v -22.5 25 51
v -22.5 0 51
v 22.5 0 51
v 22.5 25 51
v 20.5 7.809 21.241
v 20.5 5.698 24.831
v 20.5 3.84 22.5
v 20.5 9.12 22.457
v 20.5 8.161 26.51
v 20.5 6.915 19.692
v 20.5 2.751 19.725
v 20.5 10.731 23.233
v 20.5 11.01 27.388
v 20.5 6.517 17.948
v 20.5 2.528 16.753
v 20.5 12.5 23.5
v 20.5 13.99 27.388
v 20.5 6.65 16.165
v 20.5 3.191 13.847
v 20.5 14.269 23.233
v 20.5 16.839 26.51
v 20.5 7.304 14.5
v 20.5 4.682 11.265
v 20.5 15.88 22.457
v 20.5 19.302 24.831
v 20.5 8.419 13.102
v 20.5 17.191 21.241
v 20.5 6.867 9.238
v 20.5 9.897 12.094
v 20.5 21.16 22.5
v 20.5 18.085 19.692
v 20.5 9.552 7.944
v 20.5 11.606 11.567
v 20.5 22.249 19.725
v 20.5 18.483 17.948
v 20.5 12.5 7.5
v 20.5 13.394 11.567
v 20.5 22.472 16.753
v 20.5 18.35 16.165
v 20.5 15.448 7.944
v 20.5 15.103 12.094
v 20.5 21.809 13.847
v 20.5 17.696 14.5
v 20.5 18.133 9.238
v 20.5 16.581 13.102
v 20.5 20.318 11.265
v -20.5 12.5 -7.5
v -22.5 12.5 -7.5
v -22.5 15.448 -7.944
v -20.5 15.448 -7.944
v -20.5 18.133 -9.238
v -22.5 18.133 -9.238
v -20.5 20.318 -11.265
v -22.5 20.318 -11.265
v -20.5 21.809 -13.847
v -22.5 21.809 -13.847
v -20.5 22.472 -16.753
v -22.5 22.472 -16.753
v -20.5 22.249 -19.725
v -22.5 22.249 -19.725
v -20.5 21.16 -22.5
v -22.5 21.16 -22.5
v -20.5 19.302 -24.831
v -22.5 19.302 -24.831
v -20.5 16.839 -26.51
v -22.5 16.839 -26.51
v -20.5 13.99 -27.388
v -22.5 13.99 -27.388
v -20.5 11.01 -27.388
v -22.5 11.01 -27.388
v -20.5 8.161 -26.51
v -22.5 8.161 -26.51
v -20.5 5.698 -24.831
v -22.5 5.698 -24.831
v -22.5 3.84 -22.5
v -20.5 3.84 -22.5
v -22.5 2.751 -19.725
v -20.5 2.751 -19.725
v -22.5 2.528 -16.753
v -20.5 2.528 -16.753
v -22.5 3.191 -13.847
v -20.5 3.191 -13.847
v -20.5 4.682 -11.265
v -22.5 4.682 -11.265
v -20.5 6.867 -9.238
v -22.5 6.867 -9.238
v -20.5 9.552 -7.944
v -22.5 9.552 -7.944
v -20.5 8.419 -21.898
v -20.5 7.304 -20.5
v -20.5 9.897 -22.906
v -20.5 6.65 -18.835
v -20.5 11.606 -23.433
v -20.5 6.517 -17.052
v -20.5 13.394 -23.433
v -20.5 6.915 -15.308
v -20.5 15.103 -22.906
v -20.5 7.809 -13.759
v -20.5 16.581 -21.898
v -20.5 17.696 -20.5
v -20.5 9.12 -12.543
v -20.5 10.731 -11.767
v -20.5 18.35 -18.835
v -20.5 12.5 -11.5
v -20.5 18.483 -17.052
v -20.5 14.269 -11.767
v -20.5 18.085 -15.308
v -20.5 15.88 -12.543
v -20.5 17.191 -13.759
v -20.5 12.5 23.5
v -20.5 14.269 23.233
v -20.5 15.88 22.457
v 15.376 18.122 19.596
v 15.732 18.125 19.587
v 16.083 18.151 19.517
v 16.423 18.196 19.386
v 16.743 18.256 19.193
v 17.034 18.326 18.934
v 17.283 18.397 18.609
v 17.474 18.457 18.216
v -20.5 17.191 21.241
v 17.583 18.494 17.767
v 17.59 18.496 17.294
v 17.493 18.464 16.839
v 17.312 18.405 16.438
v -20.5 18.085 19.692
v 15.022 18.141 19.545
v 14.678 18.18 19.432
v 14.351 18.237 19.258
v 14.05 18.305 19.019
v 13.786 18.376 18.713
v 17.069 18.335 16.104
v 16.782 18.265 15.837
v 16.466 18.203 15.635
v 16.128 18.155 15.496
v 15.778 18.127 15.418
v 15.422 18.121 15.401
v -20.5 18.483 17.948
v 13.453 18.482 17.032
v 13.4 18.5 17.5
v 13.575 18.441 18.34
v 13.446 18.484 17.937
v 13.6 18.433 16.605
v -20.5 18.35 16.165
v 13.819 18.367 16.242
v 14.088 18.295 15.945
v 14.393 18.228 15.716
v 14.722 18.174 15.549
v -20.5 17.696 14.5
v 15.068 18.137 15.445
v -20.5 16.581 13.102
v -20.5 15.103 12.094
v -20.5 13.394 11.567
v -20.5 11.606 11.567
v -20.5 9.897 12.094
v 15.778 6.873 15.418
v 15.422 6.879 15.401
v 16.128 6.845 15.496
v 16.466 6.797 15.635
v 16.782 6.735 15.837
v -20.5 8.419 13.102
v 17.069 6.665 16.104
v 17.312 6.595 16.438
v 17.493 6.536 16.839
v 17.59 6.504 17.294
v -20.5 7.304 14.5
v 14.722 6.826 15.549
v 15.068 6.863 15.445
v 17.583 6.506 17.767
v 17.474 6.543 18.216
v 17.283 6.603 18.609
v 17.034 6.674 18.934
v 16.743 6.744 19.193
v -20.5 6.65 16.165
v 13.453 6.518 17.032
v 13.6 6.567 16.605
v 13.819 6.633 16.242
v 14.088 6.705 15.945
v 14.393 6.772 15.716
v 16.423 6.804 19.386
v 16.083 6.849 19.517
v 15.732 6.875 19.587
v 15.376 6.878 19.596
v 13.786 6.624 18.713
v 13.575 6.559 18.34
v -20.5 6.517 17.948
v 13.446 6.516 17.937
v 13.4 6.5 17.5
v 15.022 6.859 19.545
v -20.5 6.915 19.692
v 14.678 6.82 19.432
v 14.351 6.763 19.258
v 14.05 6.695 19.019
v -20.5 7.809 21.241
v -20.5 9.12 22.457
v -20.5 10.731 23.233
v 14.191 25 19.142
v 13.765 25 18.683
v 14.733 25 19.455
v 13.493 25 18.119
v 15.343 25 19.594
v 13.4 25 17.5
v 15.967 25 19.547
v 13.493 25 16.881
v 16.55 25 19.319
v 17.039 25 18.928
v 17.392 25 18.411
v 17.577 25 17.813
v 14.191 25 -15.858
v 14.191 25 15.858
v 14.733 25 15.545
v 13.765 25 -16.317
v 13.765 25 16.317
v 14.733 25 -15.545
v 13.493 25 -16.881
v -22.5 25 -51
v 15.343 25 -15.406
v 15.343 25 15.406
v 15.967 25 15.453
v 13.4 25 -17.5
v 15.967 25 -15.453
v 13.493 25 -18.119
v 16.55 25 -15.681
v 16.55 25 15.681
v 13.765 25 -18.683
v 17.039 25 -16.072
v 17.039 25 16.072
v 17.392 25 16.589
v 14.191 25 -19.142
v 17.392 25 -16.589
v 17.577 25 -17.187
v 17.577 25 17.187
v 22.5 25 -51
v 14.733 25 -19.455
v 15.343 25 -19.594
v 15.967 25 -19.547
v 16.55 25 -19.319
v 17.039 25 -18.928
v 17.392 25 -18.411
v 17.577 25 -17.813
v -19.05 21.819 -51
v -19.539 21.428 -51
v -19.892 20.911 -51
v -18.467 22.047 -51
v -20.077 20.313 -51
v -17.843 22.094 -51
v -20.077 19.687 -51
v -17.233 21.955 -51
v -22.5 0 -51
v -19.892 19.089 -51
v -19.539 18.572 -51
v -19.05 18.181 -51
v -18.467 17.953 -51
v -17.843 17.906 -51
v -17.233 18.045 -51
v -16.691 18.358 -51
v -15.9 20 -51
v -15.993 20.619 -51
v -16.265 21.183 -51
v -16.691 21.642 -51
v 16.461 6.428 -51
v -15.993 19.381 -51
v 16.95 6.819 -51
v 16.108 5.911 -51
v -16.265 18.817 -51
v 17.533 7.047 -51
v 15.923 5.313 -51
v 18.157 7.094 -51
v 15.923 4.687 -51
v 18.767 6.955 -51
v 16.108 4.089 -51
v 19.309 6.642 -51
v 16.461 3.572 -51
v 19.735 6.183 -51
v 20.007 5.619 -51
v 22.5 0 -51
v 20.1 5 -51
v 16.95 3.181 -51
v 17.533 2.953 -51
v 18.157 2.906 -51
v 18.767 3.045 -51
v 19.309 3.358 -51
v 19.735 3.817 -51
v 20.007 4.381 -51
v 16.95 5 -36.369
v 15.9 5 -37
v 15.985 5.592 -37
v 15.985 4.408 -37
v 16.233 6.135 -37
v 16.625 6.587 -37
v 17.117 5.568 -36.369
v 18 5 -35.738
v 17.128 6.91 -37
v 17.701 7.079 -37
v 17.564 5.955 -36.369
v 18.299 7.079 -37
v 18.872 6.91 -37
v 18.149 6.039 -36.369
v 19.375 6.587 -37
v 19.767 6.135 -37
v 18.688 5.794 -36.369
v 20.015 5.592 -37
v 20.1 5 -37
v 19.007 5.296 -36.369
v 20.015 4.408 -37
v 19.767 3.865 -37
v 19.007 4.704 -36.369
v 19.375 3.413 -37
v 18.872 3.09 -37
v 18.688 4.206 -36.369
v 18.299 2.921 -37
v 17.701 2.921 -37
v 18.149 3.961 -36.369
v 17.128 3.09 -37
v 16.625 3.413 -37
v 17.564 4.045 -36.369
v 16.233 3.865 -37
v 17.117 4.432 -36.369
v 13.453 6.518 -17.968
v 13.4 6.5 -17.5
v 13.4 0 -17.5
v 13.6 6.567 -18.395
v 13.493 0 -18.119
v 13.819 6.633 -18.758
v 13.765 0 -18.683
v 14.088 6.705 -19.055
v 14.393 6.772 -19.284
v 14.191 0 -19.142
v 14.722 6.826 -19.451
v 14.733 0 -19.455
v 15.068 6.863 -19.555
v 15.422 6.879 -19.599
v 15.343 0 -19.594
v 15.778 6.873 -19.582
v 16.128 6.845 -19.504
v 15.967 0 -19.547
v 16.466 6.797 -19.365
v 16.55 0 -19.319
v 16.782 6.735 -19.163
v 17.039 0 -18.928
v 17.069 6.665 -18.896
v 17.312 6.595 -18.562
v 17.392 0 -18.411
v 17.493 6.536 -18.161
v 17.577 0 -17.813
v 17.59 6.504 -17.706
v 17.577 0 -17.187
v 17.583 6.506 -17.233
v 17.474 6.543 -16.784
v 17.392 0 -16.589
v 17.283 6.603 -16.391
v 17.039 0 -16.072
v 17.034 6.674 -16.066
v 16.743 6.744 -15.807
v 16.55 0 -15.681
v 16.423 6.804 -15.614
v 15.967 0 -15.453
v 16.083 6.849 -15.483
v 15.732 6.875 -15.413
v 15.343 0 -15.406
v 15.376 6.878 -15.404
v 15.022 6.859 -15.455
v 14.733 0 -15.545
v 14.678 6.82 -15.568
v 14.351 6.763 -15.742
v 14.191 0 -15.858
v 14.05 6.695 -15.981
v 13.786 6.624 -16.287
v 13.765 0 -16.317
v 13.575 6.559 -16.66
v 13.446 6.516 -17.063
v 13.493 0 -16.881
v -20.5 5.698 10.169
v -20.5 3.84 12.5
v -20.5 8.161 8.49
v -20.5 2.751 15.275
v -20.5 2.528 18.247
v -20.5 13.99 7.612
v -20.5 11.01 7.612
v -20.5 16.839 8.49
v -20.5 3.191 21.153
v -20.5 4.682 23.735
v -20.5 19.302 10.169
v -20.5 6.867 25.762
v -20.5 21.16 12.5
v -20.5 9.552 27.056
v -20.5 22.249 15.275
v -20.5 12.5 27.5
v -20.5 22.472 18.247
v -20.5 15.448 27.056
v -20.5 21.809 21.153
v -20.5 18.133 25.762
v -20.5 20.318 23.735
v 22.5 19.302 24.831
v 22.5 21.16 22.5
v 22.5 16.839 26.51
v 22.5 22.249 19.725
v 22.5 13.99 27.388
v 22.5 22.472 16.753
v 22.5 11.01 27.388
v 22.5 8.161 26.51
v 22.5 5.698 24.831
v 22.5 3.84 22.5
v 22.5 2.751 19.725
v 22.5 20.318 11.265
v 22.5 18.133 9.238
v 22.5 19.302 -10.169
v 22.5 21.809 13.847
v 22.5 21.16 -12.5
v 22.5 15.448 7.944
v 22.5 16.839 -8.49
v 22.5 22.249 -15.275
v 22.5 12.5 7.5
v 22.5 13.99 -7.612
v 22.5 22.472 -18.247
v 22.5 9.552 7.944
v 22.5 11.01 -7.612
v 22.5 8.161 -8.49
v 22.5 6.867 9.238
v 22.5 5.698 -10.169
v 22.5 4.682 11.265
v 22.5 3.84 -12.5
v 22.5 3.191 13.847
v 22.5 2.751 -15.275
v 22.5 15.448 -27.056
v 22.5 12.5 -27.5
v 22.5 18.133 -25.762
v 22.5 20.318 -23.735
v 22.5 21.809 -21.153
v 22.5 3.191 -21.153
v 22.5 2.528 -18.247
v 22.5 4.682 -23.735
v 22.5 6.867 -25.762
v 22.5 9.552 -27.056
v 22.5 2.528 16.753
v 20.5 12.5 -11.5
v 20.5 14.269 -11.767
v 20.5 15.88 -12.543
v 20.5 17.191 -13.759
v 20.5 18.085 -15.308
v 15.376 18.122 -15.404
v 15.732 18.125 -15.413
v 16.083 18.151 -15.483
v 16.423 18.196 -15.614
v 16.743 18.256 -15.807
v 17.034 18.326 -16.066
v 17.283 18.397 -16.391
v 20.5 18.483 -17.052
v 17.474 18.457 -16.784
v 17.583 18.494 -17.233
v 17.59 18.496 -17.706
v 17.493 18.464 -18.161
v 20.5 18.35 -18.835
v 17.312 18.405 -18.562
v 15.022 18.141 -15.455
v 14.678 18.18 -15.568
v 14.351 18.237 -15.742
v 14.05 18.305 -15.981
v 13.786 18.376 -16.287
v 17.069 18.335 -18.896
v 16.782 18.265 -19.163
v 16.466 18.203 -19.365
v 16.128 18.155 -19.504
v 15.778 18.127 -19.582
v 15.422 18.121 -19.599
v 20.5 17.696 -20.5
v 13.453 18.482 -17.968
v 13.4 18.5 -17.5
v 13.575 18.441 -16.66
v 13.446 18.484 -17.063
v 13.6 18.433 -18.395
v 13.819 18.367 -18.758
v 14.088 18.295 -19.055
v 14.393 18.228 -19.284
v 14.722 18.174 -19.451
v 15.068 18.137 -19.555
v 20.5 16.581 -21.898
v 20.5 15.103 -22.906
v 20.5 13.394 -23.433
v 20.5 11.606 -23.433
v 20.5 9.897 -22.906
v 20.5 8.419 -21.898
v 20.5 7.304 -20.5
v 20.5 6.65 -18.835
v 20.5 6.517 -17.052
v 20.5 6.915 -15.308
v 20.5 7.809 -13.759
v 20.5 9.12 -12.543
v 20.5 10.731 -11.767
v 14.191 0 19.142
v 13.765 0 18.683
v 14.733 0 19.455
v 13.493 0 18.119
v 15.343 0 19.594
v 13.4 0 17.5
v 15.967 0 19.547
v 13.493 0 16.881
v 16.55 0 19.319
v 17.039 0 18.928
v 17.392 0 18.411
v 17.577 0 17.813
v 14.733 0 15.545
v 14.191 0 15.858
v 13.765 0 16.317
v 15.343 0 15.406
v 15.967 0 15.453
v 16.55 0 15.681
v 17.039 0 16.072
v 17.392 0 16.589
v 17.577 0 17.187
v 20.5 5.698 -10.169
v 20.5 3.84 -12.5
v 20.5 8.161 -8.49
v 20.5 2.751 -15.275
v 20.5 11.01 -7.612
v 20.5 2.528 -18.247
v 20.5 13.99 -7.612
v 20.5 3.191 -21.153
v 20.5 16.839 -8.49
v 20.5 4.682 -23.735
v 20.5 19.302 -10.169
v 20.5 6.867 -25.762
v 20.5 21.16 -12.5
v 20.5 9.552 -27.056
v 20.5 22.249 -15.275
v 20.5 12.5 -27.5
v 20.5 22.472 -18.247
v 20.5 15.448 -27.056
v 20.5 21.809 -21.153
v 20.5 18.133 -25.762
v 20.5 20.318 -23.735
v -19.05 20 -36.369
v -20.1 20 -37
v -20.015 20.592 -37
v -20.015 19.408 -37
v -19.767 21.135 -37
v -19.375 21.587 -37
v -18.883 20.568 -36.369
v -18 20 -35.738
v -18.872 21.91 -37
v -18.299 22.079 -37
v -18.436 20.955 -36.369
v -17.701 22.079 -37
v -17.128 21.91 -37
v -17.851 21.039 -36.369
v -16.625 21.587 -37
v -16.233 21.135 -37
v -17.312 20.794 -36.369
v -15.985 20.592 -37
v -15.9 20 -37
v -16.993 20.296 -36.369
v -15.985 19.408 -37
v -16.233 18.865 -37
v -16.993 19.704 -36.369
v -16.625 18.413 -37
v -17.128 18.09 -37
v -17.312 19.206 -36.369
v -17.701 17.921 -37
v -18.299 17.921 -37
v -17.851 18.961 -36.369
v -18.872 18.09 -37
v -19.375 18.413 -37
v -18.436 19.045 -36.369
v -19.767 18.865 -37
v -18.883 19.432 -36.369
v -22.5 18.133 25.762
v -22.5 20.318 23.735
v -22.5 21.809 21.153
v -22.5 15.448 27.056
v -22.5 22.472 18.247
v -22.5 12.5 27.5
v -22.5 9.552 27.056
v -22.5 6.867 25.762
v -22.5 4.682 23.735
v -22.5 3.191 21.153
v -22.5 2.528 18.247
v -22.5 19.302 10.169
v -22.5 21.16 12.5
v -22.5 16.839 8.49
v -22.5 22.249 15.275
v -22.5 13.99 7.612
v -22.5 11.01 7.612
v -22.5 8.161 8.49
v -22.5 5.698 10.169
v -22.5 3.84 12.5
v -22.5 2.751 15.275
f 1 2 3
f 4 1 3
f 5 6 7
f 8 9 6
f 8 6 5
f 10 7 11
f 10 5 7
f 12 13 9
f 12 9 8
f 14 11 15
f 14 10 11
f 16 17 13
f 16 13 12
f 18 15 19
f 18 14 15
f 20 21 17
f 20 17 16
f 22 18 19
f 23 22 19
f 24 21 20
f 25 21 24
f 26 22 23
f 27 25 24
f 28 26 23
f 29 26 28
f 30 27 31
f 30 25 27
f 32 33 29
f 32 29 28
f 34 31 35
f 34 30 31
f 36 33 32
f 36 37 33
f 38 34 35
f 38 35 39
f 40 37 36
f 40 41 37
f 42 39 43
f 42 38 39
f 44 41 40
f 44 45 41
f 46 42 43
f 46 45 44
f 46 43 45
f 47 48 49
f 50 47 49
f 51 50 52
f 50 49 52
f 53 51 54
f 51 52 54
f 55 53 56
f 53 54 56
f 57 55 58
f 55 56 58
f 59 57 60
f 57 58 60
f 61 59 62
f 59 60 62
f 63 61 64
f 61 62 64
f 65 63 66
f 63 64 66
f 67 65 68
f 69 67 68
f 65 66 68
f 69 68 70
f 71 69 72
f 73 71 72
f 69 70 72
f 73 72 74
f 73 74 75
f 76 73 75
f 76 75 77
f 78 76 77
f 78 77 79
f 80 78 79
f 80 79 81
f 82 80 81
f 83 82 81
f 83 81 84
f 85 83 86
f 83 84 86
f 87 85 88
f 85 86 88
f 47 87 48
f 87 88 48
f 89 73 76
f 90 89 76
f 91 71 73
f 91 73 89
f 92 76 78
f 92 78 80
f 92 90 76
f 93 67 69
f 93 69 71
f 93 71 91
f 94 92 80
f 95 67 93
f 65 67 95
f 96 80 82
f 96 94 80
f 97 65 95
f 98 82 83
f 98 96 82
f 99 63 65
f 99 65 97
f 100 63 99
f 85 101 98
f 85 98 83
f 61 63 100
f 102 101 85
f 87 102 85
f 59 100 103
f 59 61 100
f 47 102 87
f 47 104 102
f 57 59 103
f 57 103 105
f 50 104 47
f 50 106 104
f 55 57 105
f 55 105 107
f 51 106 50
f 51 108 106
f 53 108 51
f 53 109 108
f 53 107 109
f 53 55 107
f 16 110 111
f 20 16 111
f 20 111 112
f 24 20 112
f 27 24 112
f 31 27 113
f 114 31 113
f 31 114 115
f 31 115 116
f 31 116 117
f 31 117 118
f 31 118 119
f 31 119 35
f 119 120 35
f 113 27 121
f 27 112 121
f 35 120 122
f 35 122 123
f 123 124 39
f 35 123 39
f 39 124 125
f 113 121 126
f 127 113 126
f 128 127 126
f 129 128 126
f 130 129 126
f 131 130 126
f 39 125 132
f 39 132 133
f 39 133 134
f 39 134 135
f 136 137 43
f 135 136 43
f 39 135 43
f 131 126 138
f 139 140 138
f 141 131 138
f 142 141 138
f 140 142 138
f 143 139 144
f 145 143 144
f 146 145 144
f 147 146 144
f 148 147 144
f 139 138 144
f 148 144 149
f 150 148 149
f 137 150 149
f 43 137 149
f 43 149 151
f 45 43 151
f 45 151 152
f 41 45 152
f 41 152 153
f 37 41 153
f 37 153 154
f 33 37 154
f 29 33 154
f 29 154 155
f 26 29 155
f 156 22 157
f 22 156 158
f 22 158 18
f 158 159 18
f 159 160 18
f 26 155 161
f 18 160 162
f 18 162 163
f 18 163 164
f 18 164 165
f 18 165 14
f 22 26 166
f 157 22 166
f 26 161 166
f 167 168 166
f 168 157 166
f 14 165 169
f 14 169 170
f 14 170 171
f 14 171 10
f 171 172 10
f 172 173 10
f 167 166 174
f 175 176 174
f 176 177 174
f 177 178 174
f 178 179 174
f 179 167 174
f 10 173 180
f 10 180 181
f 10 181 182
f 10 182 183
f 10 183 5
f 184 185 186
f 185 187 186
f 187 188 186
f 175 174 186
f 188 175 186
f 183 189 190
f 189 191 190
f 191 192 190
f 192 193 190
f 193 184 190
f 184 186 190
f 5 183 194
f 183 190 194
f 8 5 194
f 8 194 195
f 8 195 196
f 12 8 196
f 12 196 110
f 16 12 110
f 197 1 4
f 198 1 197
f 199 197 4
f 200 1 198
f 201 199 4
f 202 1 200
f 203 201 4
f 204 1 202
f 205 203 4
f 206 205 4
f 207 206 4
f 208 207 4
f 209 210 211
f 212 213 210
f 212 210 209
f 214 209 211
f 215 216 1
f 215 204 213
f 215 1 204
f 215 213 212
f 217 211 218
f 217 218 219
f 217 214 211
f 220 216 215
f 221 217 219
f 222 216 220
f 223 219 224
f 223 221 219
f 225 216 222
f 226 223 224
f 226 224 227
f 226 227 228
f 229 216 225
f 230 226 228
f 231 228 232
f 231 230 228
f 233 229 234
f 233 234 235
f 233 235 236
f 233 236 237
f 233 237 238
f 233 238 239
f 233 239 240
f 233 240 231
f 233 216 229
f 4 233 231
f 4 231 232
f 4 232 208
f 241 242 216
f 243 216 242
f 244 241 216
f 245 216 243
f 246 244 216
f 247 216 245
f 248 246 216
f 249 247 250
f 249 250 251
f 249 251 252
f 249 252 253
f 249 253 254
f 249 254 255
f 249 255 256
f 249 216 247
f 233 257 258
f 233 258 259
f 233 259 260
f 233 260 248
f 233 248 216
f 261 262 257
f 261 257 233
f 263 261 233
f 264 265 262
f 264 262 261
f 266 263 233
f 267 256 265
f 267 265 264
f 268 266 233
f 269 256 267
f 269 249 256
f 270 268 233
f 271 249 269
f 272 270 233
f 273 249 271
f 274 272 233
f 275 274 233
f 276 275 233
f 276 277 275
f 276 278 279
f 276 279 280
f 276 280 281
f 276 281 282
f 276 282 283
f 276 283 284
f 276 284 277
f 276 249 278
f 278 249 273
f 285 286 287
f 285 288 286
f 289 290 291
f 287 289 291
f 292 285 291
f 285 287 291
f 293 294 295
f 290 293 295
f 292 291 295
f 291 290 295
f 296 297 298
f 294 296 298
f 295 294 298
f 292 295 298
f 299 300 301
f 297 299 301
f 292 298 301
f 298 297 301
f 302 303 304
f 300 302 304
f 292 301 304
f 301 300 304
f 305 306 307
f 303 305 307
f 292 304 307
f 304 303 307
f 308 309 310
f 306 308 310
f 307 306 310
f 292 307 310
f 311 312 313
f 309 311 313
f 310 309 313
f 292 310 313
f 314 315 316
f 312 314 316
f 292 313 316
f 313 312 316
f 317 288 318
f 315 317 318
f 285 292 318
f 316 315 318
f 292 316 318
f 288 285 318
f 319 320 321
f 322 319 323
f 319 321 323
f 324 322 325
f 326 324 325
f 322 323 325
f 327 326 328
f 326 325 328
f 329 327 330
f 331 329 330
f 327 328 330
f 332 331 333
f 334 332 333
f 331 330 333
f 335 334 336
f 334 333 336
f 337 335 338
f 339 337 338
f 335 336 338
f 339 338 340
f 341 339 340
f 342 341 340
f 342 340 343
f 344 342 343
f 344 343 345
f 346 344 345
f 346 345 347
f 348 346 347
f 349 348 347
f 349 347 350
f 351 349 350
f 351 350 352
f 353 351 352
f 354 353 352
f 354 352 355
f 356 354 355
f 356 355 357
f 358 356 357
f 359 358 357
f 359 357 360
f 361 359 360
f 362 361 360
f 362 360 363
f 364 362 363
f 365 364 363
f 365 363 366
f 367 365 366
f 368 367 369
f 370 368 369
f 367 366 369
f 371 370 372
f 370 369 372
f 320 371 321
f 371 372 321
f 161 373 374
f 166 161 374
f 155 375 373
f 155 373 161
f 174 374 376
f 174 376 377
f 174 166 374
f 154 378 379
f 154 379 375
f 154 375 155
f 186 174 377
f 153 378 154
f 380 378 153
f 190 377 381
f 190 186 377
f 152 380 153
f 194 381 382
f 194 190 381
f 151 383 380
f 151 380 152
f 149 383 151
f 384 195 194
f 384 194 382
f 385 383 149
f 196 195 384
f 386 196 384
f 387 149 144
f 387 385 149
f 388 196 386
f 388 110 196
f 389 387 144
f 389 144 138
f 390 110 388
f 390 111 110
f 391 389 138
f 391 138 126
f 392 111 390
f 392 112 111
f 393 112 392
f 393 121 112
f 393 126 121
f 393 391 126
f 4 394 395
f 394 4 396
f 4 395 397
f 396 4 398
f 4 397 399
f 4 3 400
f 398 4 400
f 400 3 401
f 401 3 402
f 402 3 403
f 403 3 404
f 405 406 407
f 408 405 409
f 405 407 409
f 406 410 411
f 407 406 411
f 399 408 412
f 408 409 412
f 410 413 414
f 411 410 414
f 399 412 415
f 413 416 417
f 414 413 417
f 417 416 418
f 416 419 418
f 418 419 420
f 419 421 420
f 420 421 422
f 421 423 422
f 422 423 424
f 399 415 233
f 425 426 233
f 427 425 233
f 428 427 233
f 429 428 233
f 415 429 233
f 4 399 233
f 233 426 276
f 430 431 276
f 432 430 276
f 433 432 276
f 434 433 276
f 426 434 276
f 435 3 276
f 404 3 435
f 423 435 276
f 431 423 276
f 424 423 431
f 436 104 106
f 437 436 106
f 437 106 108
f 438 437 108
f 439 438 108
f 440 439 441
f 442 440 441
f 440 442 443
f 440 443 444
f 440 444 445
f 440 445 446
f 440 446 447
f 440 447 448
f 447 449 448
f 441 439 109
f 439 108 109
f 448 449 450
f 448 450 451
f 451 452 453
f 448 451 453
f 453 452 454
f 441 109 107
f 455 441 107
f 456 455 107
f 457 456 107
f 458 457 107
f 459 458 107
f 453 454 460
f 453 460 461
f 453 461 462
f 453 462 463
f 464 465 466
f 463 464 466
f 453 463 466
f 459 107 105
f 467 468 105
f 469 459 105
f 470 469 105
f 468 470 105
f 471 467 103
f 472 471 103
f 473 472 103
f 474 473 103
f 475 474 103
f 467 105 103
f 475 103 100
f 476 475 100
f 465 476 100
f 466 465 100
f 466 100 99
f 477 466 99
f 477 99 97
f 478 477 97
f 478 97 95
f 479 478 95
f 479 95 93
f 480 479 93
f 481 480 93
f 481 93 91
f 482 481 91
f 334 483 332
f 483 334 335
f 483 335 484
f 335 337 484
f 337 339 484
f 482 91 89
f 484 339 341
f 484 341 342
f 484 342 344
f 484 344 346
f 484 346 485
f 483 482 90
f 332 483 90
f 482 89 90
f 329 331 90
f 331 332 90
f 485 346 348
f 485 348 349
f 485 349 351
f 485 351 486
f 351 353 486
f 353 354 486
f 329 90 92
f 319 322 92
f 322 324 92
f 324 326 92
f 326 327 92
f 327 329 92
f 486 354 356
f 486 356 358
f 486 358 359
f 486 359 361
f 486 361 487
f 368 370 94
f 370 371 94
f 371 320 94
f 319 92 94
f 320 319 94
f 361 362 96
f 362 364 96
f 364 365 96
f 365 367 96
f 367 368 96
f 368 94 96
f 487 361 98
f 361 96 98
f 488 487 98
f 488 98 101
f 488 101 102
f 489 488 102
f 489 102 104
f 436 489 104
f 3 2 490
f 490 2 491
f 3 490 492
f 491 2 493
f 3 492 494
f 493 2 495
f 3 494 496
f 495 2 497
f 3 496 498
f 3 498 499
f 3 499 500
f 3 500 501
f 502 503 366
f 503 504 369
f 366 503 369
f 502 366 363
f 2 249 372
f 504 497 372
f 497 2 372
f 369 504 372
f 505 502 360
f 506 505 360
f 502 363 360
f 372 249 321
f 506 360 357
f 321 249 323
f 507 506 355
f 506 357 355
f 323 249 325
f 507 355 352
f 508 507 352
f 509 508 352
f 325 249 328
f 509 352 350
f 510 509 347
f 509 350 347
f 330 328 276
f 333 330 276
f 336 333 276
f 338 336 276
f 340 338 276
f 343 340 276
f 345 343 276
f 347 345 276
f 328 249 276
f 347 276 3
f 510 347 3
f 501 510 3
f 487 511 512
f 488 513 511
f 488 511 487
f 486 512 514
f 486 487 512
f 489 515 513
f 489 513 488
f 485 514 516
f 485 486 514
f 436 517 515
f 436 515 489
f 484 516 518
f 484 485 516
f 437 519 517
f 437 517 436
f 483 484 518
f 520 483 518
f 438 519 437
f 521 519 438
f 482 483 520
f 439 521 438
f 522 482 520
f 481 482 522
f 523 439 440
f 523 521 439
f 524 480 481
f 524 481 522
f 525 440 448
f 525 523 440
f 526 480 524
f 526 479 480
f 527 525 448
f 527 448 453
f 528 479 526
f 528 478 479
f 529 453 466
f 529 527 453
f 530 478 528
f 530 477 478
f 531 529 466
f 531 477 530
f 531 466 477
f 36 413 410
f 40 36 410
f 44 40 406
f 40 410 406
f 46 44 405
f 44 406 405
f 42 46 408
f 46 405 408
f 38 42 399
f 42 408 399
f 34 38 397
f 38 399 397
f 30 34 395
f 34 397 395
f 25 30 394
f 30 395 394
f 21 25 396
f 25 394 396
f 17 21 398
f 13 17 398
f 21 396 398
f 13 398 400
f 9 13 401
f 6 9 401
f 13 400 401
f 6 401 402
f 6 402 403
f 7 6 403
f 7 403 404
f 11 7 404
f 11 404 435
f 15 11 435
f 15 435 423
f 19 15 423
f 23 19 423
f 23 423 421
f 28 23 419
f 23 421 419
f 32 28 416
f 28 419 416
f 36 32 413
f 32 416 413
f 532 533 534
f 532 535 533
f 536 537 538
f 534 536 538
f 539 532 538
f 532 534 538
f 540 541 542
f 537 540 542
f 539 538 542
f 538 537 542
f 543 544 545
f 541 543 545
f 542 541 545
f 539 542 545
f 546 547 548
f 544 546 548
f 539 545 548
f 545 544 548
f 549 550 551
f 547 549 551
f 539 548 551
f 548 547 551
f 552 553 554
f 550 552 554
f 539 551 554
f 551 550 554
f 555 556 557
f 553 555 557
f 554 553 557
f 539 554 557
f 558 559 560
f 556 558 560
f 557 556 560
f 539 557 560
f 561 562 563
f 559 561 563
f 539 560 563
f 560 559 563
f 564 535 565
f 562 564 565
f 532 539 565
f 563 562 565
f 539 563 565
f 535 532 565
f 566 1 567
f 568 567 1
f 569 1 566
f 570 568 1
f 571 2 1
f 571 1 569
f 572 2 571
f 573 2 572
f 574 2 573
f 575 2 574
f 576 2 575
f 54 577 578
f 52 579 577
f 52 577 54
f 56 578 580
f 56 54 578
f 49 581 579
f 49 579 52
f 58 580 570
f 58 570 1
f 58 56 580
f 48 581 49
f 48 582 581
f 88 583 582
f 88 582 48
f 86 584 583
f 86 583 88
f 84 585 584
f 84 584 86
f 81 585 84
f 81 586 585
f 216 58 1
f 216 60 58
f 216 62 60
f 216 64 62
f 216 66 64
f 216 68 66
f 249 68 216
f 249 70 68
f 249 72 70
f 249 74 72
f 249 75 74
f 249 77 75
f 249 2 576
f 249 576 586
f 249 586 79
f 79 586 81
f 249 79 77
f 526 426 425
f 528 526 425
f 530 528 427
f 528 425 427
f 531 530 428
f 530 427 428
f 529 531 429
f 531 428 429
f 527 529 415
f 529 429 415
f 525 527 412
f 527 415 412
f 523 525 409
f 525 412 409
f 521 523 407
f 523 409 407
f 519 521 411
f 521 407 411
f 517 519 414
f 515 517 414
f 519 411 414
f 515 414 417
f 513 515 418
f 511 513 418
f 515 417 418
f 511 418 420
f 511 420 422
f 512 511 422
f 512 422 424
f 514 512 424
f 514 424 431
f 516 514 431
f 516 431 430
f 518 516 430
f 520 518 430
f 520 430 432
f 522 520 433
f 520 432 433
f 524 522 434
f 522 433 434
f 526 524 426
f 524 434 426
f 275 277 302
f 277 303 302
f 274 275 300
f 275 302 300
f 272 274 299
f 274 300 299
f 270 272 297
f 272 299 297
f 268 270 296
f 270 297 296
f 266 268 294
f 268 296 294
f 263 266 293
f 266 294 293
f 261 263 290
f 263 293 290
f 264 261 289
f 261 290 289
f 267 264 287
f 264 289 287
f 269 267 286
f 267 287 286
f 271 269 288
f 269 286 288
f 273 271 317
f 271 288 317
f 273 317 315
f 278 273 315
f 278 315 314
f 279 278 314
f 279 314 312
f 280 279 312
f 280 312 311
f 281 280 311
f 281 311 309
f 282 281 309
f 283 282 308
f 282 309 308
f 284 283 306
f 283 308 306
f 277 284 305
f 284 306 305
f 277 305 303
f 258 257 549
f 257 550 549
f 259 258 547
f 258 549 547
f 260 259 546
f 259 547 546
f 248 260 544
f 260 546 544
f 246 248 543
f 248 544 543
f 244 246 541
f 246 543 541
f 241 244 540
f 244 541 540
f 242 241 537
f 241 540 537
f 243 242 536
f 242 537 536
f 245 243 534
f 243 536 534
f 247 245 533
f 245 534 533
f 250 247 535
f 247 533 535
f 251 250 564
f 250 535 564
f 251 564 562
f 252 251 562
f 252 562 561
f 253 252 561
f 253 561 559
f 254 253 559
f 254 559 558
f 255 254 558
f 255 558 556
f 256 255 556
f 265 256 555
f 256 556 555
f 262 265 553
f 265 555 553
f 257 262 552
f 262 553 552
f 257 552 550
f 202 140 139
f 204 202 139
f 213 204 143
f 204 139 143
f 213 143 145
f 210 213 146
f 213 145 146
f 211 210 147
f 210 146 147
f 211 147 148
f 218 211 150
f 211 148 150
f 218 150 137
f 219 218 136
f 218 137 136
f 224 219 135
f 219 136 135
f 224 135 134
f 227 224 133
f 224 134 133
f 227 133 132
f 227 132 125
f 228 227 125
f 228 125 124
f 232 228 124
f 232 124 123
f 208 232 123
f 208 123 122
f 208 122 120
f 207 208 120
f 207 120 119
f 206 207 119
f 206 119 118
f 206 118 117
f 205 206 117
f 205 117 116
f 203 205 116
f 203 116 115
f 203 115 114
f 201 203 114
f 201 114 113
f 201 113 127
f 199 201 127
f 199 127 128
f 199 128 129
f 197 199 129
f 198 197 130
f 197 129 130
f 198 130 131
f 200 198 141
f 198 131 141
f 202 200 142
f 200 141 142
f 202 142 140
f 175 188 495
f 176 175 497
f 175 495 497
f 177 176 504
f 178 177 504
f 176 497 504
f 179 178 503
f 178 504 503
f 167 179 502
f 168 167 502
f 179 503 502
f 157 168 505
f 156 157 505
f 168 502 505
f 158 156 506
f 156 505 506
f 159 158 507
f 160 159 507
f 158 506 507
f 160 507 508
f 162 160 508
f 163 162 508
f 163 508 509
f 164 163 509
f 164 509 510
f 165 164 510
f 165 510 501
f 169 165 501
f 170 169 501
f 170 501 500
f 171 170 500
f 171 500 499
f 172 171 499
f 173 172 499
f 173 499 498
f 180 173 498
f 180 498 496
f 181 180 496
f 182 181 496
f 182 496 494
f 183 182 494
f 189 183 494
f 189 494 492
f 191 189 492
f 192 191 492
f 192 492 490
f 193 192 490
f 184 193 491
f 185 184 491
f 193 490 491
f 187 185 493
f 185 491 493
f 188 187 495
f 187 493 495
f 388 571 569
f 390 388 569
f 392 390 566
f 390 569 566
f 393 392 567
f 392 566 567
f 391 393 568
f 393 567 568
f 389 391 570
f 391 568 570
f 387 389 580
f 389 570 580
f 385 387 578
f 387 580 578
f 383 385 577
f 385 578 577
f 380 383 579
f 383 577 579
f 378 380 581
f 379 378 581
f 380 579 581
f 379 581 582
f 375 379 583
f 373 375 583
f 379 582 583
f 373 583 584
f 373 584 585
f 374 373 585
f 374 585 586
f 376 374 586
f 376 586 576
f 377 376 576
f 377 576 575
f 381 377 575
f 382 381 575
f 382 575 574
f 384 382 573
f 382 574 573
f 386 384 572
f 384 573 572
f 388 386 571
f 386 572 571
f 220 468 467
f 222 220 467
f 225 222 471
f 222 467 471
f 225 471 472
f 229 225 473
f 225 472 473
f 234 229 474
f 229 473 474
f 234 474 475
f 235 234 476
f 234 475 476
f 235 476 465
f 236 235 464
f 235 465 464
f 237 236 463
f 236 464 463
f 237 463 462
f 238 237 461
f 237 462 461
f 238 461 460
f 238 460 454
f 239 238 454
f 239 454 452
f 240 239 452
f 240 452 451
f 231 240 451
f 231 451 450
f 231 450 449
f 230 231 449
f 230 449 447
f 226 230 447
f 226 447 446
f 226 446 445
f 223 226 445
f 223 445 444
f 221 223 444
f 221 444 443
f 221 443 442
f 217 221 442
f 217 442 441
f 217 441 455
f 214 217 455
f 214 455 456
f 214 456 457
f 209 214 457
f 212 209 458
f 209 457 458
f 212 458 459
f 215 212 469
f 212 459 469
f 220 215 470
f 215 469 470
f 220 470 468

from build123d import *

# Parameters (mm, degrees)
SKETCH1_W             = 45
SKETCH1_H             = 102
BOSS_EXTRUDE1_DEPTH   = 25
M5_TAPPED_HOLE3_D     = 4.2
SKETCH27_R            = 6
CUT_EXTRUDE1_DEPTH    = 74
SKETCH28_R            = 10
CUT_EXTRUDE3_DEPTH    = 2
SKETCH30_R            = 10
CUT_EXTRUDE4_DEPTH    = 2
M5_TAPPED_HOLE4_D     = 4.2
M5_TAPPED_HOLE4_DEPTH = 14
M5_TAPPED_HOLE4_TIP   = 1.2618073


with BuildPart() as part:
    # Sketch1 → Boss-Extrude1 (new body)
    with BuildSketch(Plane(origin=(0, 0, 0), x_dir=(1, 0, 0), z_dir=(0, 1, 0))):
        Rectangle(SKETCH1_W, SKETCH1_H)
    extrude(amount=BOSS_EXTRUDE1_DEPTH)

    # M5 Tapped Hole3 (through all)
    with Locations(Plane(origin=(0, 25, 0), x_dir=(1, 0, 0), z_dir=(0, 1, 0))):
        with Locations((15.5, 17.5), (15.5, -17.5)):
            Hole(M5_TAPPED_HOLE3_D / 2)

    # Sketch27 → Cut-Extrude1 (cut)
    with BuildSketch(Plane.ZY.offset(22.5)):
        with Locations((-17.5, 12.5)):
            Circle(SKETCH27_R)
        with Locations((17.5, 12.5)):
            Circle(SKETCH27_R)
    extrude(amount=-CUT_EXTRUDE1_DEPTH, mode=Mode.SUBTRACT)

    # Sketch28 → Cut-Extrude3 (cut)
    with BuildSketch(Plane.ZY.offset(22.5)):
        with Locations((-17.5, 12.5)):
            Circle(SKETCH28_R)
        with Locations((17.5, 12.5)):
            Circle(SKETCH28_R)
    extrude(amount=-CUT_EXTRUDE3_DEPTH, mode=Mode.SUBTRACT)

    # Sketch30 → Cut-Extrude4 (cut)
    with BuildSketch(Plane(origin=(22.5, 0, 0), x_dir=(0, 0, -1), z_dir=(1, 0, 0))):
        with Locations((-17.5, 12.5)):
            Circle(SKETCH30_R)
        with Locations((17.5, 12.5)):
            Circle(SKETCH30_R)
    extrude(amount=-CUT_EXTRUDE4_DEPTH, mode=Mode.SUBTRACT)

    # M5 Tapped Hole4
    with Locations(Plane(origin=(0, 0, -51), x_dir=(-1, 0, 0), z_dir=(0, 0, -1))):
        with Locations((-18, 5), (18, 20)):
            Hole(M5_TAPPED_HOLE4_D / 2, depth=M5_TAPPED_HOLE4_DEPTH)
            with Locations((0, 0, -(M5_TAPPED_HOLE4_DEPTH + M5_TAPPED_HOLE4_TIP / 2))):  # 118° drill point
                Cone(0, M5_TAPPED_HOLE4_D / 2, M5_TAPPED_HOLE4_TIP, mode=Mode.SUBTRACT)


solid = part.part
